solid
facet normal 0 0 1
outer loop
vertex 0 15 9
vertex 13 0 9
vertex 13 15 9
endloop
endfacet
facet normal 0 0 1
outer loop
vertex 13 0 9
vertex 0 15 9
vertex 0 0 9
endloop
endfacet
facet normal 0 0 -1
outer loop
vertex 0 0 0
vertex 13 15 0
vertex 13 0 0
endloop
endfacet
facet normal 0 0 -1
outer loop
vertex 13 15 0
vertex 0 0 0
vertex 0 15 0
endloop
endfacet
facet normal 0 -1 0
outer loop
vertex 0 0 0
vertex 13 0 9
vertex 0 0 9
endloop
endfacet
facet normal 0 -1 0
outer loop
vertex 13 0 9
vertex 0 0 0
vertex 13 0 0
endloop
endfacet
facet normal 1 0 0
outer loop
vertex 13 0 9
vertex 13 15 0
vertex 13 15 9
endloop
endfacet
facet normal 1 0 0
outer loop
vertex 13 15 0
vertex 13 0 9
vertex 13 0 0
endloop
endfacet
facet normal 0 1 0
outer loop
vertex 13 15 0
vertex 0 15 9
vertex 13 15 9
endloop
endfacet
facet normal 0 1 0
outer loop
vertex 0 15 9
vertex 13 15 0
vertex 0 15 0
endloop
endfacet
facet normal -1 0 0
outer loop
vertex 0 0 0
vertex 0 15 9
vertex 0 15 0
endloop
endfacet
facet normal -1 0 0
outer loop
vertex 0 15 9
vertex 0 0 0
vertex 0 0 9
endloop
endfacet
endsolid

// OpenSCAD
// Generated by SolidPython 1.0.1 on 2020-07-29 00:46:55


cube(size = [13, 15, 9]);
/***********************************************
*********      SolidPython code:      **********
************************************************
 
# import packages: SolidPython
from solid import *
from solid.utils import *
from itertools import chain, combinations, permutations


class Resize:

    def __init__(self, scad_file):
        self.scad_file = scad_file
        #self.scad_file = import_scad(scad_file)
        # cone/cylinder param:
        self.r1 = 0
        self.r2 = 0
        self.h = 0
        # rectangular prism param:
        self.w = 0
        self.l = 0
        # ellipse param:
        self.r = 0

    # import OpenScad code (file name corresponds to shape)


    # classify shape + parameters
    def assign(self, param1, param2, param3):
        if self.scad_file == 'cone.scad':
            self.r1 = param1
            self.r2 = param2
            self.h = param3
        elif self.scad_file == 'cylinder.scad':
            self.r1 = param1
            self.r2 = param2
            self.h = param3
        elif self.scad_file == 'rectangularPrism.scad':
            self.h = param1
            self.l = param2
            self.w = param3
        else:
            self.r = param1
            self.h = param2

    # resize parameters
    def iterate(self):
        x = range(3, 20, 2)
        i = 1
        if self.scad_file == 'cone.scad':
            tempList = list(permutations(x, 2))
            for temp in tempList:
                param1 = temp[0]
                param2 = temp[1]
                filepath = 'produced_scad_files/' + 'cone' + str(param1) + '_' + str(param2) + '_' + '.scad'
                scad_render_to_file(cylinder(h=param1, r1=param2, r2=0), filepath)

        elif self.scad_file == 'cylinder.scad':
            tempList = list(permutations(x, 3))
            for temp in tempList:
                param1 = temp[0]
                param2 = temp[1]
                filepath = 'produced_scad_files/' + 'cylinder' + str(param1) + '_' + str(param2) + '_' + '.scad'
                scad_render_to_file(cylinder(h=param1, r1=param2, r2=param2), filepath)

        elif self.scad_file == 'rectangularPrism.scad':
            tempList = list(permutations(x, 3))
            for temp in tempList:
                param1 = temp[0]
                param2 = temp[1]
                param3 = temp[2]
                filepath = 'produced_scad_files/' + 'rectangularPrism' + str(param1) + '_' + str(param2) + '_' + str(
                    param3) + '.scad'
                scad_render_to_file(cube(size=(param1, param2, param3)), filepath)

        elif self.scad_file == 'ellipse.scad':
            tempList = list(permutations(x, 4))
            for temp in tempList:
                param1 = temp[0]
                param2 = temp[1]
                param3 = temp[2]
                param4 = temp[3]
                filepath = 'produced_scad_files/' + 'ellipse' + str(param1) + '_' + str(param2) + '_' + str(param3) + '_' + str(param4) + '.scad'
                scad_render_to_file(scale([param1, param2, param3])(sphere(r=param4)), filepath)

    def render_to_scadfile(self):
        scad_render_to_file(scad, 'example.scad') 
 
************************************************/
